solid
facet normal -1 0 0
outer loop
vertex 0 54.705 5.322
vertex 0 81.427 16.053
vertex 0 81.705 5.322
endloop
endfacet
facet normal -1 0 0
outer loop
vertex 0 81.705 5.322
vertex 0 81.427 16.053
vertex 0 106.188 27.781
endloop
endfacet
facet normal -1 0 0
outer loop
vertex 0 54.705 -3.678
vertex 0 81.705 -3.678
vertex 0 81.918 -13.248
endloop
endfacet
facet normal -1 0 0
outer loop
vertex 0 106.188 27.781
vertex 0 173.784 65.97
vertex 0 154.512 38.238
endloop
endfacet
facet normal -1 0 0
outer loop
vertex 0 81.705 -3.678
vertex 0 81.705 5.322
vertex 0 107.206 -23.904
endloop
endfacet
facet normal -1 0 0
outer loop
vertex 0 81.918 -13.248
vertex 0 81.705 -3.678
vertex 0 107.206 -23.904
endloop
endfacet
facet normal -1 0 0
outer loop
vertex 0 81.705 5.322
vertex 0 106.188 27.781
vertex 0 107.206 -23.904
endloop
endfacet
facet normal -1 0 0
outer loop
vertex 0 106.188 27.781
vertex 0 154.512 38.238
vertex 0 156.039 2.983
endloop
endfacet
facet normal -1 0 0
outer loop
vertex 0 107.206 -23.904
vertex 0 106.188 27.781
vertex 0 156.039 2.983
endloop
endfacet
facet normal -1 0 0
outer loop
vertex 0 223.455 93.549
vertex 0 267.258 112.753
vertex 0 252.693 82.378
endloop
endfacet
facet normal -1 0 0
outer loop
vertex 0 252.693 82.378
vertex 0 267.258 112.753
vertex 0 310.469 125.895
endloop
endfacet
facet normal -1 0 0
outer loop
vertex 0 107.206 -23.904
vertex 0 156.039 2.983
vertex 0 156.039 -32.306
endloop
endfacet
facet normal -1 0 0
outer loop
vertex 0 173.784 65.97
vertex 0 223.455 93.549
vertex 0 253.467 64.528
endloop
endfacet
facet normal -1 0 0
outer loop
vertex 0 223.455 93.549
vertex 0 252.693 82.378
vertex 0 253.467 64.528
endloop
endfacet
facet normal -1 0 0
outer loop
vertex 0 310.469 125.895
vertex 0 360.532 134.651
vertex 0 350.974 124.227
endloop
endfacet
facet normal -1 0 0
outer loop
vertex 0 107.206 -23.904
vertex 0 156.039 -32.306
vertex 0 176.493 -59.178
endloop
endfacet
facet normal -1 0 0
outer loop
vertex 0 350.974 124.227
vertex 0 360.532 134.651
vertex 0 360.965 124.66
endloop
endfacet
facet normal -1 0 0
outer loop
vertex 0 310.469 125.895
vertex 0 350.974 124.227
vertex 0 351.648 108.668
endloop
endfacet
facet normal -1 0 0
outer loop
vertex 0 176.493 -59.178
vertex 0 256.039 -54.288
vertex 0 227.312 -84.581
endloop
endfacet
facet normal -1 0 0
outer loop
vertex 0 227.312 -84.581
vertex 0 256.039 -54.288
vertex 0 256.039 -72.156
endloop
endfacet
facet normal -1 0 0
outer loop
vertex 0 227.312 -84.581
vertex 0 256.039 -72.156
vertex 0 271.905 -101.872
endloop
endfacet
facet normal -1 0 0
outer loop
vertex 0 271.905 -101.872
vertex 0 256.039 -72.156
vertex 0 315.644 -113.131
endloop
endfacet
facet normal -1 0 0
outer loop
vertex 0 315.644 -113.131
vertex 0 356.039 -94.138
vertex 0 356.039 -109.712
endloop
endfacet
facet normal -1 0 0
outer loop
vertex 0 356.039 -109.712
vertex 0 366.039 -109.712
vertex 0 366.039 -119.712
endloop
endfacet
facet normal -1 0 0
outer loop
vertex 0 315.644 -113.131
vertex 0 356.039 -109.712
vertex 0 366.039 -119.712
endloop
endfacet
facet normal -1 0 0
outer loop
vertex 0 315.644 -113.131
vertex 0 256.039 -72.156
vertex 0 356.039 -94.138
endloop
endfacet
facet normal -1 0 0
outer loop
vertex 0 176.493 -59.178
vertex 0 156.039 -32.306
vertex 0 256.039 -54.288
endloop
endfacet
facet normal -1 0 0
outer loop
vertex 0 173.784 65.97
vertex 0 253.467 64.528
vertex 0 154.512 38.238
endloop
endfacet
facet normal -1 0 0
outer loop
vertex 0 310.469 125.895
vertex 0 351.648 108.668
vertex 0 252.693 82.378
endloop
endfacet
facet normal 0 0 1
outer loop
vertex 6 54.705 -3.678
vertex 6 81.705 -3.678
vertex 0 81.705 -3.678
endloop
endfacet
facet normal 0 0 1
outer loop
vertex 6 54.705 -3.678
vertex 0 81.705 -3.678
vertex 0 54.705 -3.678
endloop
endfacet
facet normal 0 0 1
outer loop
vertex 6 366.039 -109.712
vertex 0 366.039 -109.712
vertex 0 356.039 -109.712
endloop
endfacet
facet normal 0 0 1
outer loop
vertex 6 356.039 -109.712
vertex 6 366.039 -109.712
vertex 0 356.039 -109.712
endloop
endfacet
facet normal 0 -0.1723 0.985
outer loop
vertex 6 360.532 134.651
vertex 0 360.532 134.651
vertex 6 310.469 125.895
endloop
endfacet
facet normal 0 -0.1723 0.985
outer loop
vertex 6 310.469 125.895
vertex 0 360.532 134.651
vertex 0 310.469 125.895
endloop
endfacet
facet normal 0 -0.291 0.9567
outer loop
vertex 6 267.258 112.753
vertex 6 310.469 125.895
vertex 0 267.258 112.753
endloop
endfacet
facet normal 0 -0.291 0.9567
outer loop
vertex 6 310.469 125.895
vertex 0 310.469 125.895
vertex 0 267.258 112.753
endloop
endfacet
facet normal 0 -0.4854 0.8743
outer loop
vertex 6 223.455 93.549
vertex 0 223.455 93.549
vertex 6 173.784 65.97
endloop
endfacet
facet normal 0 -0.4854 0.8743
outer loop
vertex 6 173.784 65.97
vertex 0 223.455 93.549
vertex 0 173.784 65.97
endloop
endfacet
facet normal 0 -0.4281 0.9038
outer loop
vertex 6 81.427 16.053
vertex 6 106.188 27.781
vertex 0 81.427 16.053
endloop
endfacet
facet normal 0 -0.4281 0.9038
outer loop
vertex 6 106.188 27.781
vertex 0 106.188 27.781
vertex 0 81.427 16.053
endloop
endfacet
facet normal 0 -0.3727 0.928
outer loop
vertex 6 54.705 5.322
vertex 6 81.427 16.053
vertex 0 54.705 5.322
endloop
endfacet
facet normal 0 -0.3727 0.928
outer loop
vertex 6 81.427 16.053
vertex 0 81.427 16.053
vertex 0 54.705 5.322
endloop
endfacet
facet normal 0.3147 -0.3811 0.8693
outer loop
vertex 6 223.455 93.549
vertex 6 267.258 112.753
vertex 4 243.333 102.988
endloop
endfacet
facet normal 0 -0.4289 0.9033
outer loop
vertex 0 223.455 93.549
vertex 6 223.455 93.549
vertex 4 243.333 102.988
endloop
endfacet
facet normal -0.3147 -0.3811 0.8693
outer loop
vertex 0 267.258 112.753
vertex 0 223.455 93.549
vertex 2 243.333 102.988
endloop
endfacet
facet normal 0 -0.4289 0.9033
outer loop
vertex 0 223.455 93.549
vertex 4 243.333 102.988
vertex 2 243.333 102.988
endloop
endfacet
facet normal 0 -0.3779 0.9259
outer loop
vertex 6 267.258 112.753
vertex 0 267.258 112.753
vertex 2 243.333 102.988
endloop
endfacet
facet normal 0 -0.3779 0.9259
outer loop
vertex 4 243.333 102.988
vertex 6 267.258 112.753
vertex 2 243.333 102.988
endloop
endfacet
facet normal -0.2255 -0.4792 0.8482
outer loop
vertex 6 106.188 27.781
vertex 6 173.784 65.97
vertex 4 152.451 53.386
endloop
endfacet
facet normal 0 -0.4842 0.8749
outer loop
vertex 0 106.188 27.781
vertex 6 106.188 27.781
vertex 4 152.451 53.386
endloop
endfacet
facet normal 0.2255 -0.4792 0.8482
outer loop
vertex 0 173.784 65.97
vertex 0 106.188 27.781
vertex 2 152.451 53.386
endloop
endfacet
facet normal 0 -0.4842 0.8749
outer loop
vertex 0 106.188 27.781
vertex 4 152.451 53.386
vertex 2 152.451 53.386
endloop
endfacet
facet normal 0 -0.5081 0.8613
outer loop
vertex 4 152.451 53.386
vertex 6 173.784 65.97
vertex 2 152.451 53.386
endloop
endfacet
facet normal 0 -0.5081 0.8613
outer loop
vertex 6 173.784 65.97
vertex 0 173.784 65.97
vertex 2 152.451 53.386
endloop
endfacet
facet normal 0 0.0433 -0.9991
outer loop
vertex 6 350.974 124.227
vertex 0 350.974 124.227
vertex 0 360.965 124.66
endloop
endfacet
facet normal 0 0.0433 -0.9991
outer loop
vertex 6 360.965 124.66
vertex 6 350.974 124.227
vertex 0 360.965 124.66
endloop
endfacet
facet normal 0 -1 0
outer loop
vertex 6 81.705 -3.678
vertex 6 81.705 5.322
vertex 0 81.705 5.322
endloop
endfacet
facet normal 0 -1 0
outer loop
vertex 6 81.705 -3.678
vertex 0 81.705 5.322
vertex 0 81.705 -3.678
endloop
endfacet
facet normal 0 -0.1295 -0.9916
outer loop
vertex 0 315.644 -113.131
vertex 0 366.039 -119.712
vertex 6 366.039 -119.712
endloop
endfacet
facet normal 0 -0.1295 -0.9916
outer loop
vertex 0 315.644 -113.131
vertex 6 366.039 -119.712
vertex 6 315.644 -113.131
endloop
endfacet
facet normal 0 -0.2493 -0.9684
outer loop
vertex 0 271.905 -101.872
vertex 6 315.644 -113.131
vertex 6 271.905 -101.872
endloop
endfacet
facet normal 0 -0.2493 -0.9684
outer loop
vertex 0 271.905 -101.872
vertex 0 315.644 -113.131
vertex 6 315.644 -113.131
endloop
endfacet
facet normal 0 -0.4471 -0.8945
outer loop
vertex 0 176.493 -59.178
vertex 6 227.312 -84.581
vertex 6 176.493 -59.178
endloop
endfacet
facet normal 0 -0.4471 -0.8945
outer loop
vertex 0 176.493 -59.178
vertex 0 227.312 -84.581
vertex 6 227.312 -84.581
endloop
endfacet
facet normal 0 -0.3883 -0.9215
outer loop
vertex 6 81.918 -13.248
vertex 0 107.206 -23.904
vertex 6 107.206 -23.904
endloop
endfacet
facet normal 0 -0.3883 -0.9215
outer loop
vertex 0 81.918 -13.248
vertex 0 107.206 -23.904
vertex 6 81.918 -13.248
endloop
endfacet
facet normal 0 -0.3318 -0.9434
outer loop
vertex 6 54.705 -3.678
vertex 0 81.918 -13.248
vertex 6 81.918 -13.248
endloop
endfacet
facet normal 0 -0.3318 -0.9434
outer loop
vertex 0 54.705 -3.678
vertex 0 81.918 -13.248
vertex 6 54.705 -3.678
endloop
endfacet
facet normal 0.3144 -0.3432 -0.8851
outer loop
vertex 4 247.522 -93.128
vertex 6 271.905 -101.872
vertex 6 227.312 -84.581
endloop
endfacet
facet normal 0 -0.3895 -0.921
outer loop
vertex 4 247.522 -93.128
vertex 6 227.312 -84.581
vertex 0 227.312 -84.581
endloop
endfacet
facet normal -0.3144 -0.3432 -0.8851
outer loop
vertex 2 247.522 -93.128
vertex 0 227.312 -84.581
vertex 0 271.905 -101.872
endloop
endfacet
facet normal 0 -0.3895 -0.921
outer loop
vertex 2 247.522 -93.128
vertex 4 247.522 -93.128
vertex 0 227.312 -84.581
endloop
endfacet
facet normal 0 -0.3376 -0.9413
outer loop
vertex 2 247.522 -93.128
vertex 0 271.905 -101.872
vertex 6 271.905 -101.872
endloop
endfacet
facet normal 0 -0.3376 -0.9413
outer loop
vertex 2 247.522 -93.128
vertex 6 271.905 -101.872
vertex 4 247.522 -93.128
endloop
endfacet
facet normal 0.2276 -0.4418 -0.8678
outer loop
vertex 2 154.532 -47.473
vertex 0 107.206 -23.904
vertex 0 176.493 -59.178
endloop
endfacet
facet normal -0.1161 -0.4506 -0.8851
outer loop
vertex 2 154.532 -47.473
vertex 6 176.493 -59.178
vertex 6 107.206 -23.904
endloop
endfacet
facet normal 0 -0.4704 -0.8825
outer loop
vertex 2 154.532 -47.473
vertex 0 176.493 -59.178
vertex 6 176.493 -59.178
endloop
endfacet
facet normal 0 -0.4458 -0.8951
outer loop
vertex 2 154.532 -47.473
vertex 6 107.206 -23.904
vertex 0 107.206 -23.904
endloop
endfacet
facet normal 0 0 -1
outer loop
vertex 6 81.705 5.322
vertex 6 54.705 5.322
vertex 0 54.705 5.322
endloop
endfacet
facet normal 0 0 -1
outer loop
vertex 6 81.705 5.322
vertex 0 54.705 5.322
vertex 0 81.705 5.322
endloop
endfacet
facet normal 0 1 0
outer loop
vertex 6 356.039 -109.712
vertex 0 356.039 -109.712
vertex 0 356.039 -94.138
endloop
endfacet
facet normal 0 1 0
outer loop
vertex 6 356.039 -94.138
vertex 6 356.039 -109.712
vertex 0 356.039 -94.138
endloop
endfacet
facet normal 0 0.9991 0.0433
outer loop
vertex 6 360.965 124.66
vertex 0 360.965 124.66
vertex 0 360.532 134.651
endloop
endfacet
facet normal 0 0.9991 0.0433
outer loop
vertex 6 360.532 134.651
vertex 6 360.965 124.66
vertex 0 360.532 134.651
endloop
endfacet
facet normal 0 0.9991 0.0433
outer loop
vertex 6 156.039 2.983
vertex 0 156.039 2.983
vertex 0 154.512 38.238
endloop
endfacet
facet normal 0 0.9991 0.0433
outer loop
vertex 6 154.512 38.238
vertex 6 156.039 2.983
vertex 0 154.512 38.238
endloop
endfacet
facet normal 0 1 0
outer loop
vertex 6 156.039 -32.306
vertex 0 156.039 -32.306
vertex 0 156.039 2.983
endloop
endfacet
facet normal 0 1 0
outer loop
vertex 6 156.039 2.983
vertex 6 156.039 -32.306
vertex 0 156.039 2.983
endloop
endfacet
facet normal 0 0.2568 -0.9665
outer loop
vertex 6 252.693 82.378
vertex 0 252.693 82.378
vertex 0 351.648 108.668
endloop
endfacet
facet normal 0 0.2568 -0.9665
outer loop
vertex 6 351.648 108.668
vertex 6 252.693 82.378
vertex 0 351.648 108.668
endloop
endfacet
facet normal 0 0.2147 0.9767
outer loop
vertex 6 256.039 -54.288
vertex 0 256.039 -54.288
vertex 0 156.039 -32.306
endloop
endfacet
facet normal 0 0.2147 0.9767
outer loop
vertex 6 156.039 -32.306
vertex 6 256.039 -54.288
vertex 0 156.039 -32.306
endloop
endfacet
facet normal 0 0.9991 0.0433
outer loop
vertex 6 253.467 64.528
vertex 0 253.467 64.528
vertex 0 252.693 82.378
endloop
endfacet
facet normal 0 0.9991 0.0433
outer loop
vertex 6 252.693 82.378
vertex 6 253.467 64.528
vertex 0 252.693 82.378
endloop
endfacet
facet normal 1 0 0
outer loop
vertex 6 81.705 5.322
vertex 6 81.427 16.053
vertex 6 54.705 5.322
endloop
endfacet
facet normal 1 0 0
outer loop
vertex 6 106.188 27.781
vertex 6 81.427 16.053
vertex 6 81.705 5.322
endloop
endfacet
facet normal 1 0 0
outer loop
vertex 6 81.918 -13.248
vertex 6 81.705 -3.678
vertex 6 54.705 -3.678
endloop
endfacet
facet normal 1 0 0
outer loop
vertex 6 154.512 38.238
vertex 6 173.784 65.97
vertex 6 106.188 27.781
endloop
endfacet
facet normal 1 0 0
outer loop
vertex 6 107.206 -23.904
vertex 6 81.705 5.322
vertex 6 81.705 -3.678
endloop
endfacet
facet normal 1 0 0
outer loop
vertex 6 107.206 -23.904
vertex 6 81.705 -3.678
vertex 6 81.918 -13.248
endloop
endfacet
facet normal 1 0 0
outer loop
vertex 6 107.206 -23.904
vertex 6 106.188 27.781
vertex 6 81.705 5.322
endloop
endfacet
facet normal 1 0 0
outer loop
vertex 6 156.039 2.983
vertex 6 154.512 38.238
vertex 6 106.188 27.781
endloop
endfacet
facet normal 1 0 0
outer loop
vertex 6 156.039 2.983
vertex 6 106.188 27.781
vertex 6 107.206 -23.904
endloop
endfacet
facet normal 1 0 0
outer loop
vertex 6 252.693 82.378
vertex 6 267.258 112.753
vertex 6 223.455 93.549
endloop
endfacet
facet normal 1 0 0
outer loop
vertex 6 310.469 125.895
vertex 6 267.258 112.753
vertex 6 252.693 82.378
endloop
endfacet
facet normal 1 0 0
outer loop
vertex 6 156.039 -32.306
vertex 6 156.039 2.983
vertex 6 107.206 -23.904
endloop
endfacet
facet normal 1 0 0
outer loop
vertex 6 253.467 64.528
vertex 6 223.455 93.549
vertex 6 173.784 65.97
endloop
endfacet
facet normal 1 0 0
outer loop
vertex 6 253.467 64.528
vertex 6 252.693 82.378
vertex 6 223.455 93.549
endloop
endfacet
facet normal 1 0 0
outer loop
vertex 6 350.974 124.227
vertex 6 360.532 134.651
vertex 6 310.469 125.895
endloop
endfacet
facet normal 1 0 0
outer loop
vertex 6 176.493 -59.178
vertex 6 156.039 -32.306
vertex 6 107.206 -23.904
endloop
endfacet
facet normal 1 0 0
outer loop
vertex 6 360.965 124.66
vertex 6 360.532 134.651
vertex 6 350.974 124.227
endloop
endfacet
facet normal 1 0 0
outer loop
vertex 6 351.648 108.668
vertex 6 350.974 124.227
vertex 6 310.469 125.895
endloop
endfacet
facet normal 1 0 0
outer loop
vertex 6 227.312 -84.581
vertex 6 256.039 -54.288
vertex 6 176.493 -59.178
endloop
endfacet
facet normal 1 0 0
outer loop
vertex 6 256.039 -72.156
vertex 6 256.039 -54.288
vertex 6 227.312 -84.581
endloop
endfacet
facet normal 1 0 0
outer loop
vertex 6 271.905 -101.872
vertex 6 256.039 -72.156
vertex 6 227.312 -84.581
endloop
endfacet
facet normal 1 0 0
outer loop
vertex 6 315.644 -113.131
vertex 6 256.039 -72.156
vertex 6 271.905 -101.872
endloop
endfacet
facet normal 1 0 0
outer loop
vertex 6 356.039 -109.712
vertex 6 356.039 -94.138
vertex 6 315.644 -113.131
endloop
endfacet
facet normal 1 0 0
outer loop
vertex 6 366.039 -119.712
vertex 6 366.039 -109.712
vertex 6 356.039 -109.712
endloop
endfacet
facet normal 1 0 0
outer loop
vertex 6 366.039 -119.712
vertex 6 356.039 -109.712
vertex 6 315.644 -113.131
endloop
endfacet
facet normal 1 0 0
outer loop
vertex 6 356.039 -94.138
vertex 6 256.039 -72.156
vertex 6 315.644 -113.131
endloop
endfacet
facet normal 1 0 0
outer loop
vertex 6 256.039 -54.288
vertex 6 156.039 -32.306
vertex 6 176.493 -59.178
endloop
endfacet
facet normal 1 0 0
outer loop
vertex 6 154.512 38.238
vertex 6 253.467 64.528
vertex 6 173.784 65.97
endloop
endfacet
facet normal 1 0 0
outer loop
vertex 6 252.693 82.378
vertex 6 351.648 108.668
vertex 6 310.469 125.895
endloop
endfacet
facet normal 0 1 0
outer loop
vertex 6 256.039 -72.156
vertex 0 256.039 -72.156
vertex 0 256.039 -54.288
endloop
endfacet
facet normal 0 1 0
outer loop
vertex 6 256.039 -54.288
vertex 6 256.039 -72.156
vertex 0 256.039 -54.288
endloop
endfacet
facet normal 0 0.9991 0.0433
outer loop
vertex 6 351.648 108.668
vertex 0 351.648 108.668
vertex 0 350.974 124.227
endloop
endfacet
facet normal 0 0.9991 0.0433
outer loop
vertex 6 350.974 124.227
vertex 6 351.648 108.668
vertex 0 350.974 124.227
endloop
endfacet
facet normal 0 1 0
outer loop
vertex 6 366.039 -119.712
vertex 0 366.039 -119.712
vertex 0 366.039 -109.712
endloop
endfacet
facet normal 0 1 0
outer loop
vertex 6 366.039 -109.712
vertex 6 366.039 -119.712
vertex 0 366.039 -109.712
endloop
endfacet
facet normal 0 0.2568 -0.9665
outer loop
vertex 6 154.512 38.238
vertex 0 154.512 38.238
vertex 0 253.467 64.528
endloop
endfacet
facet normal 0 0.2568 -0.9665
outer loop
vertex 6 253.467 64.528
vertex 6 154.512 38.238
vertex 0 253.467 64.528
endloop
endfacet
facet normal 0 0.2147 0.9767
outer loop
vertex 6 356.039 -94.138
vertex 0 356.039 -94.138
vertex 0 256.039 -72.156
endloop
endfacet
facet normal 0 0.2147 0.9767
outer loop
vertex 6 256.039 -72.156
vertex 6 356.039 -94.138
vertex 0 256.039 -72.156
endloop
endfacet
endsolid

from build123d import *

# Parameters (mm, degrees)
BOSS_EXTRU_3_DEPTH      = 6
ENL_V_MAT_EXTRU_1_DEPTH = 10


with BuildPart() as part:
    # Esquisse2 → Boss.-Extru.3 (new body)
    with BuildSketch(Plane(origin=(0, 0, 0), x_dir=(0, 0, -1), z_dir=(1, 0, 0))):
        with BuildLine():
            Line((119.711610695, 366.039005154), (109.711610695, 366.039005154))
            Line((109.711610695, 366.039005154), (109.711610695, 356.039005154))
            Line((109.711610695, 356.039005154), (94.138082152, 356.039005154))
            Line((94.138082152, 356.039005154), (72.155634041, 256.039005154))
            Line((72.155634041, 256.039005154), (54.28830069, 256.039005154))
            Line((54.28830069, 256.039005154), (32.305852578, 156.039005154))
            Line((32.305852578, 156.039005154), (-2.982638809, 156.039005154))
            Line((-2.982638809, 156.039005154), (-38.238065612, 154.511750988))
            Line((-38.238065612, 154.511750988), (-64.527826677, 253.466672484))
            Line((-64.527826677, 253.466672484), (-82.378418708, 252.693390368))
            Line((-82.378418708, 252.693390368), (-108.668179773, 351.648311863))
            Line((-108.668179773, 351.648311863), (-124.227116243, 350.974303556))
            Line((-124.227116243, 350.974303556), (-124.659907248, 360.964933764))
            Line((-124.659907248, 360.964933764), (-134.650537455, 360.532142759))
            add(Edge.make_bspline(
                [(-134.650537455, 360.532142759), (-117.788106266, 213.336232223), (-40.120308472, 162.829698053), (-0.484204579, 40.636249064)],
                knots=[0, 0, 0, 0, 1, 1, 1, 1], degree=3))
            add(Edge.make_bspline(
                [(119.711610695, 366.039005154), (109.23548586, 218.251223276), (33.826338548, 164.430620253), (-0.484204579, 40.636249064)],
                knots=[0, 0, 0, 0, 1, 1, 1, 1], degree=3))
        make_face()
    extrude(amount=BOSS_EXTRU_3_DEPTH)

    # Esquisse3 → Enlèv. mat.-Extru.1 (cut)
    with BuildSketch(Plane(origin=(6, 0, 0), x_dir=(0, 0, -1), z_dir=(1, 0, 0))):
        Polygon((-5.321814798, 54.705223034), (-5.321814798, 81.705223034), (3.678185202, 81.705223034), (3.678185202, 54.705223034), (9.336488724, 34.218680036), (-20.702093174, 34.218680036), align=None)
    extrude(amount=-ENL_V_MAT_EXTRU_1_DEPTH, mode=Mode.SUBTRACT)


solid = part.part
